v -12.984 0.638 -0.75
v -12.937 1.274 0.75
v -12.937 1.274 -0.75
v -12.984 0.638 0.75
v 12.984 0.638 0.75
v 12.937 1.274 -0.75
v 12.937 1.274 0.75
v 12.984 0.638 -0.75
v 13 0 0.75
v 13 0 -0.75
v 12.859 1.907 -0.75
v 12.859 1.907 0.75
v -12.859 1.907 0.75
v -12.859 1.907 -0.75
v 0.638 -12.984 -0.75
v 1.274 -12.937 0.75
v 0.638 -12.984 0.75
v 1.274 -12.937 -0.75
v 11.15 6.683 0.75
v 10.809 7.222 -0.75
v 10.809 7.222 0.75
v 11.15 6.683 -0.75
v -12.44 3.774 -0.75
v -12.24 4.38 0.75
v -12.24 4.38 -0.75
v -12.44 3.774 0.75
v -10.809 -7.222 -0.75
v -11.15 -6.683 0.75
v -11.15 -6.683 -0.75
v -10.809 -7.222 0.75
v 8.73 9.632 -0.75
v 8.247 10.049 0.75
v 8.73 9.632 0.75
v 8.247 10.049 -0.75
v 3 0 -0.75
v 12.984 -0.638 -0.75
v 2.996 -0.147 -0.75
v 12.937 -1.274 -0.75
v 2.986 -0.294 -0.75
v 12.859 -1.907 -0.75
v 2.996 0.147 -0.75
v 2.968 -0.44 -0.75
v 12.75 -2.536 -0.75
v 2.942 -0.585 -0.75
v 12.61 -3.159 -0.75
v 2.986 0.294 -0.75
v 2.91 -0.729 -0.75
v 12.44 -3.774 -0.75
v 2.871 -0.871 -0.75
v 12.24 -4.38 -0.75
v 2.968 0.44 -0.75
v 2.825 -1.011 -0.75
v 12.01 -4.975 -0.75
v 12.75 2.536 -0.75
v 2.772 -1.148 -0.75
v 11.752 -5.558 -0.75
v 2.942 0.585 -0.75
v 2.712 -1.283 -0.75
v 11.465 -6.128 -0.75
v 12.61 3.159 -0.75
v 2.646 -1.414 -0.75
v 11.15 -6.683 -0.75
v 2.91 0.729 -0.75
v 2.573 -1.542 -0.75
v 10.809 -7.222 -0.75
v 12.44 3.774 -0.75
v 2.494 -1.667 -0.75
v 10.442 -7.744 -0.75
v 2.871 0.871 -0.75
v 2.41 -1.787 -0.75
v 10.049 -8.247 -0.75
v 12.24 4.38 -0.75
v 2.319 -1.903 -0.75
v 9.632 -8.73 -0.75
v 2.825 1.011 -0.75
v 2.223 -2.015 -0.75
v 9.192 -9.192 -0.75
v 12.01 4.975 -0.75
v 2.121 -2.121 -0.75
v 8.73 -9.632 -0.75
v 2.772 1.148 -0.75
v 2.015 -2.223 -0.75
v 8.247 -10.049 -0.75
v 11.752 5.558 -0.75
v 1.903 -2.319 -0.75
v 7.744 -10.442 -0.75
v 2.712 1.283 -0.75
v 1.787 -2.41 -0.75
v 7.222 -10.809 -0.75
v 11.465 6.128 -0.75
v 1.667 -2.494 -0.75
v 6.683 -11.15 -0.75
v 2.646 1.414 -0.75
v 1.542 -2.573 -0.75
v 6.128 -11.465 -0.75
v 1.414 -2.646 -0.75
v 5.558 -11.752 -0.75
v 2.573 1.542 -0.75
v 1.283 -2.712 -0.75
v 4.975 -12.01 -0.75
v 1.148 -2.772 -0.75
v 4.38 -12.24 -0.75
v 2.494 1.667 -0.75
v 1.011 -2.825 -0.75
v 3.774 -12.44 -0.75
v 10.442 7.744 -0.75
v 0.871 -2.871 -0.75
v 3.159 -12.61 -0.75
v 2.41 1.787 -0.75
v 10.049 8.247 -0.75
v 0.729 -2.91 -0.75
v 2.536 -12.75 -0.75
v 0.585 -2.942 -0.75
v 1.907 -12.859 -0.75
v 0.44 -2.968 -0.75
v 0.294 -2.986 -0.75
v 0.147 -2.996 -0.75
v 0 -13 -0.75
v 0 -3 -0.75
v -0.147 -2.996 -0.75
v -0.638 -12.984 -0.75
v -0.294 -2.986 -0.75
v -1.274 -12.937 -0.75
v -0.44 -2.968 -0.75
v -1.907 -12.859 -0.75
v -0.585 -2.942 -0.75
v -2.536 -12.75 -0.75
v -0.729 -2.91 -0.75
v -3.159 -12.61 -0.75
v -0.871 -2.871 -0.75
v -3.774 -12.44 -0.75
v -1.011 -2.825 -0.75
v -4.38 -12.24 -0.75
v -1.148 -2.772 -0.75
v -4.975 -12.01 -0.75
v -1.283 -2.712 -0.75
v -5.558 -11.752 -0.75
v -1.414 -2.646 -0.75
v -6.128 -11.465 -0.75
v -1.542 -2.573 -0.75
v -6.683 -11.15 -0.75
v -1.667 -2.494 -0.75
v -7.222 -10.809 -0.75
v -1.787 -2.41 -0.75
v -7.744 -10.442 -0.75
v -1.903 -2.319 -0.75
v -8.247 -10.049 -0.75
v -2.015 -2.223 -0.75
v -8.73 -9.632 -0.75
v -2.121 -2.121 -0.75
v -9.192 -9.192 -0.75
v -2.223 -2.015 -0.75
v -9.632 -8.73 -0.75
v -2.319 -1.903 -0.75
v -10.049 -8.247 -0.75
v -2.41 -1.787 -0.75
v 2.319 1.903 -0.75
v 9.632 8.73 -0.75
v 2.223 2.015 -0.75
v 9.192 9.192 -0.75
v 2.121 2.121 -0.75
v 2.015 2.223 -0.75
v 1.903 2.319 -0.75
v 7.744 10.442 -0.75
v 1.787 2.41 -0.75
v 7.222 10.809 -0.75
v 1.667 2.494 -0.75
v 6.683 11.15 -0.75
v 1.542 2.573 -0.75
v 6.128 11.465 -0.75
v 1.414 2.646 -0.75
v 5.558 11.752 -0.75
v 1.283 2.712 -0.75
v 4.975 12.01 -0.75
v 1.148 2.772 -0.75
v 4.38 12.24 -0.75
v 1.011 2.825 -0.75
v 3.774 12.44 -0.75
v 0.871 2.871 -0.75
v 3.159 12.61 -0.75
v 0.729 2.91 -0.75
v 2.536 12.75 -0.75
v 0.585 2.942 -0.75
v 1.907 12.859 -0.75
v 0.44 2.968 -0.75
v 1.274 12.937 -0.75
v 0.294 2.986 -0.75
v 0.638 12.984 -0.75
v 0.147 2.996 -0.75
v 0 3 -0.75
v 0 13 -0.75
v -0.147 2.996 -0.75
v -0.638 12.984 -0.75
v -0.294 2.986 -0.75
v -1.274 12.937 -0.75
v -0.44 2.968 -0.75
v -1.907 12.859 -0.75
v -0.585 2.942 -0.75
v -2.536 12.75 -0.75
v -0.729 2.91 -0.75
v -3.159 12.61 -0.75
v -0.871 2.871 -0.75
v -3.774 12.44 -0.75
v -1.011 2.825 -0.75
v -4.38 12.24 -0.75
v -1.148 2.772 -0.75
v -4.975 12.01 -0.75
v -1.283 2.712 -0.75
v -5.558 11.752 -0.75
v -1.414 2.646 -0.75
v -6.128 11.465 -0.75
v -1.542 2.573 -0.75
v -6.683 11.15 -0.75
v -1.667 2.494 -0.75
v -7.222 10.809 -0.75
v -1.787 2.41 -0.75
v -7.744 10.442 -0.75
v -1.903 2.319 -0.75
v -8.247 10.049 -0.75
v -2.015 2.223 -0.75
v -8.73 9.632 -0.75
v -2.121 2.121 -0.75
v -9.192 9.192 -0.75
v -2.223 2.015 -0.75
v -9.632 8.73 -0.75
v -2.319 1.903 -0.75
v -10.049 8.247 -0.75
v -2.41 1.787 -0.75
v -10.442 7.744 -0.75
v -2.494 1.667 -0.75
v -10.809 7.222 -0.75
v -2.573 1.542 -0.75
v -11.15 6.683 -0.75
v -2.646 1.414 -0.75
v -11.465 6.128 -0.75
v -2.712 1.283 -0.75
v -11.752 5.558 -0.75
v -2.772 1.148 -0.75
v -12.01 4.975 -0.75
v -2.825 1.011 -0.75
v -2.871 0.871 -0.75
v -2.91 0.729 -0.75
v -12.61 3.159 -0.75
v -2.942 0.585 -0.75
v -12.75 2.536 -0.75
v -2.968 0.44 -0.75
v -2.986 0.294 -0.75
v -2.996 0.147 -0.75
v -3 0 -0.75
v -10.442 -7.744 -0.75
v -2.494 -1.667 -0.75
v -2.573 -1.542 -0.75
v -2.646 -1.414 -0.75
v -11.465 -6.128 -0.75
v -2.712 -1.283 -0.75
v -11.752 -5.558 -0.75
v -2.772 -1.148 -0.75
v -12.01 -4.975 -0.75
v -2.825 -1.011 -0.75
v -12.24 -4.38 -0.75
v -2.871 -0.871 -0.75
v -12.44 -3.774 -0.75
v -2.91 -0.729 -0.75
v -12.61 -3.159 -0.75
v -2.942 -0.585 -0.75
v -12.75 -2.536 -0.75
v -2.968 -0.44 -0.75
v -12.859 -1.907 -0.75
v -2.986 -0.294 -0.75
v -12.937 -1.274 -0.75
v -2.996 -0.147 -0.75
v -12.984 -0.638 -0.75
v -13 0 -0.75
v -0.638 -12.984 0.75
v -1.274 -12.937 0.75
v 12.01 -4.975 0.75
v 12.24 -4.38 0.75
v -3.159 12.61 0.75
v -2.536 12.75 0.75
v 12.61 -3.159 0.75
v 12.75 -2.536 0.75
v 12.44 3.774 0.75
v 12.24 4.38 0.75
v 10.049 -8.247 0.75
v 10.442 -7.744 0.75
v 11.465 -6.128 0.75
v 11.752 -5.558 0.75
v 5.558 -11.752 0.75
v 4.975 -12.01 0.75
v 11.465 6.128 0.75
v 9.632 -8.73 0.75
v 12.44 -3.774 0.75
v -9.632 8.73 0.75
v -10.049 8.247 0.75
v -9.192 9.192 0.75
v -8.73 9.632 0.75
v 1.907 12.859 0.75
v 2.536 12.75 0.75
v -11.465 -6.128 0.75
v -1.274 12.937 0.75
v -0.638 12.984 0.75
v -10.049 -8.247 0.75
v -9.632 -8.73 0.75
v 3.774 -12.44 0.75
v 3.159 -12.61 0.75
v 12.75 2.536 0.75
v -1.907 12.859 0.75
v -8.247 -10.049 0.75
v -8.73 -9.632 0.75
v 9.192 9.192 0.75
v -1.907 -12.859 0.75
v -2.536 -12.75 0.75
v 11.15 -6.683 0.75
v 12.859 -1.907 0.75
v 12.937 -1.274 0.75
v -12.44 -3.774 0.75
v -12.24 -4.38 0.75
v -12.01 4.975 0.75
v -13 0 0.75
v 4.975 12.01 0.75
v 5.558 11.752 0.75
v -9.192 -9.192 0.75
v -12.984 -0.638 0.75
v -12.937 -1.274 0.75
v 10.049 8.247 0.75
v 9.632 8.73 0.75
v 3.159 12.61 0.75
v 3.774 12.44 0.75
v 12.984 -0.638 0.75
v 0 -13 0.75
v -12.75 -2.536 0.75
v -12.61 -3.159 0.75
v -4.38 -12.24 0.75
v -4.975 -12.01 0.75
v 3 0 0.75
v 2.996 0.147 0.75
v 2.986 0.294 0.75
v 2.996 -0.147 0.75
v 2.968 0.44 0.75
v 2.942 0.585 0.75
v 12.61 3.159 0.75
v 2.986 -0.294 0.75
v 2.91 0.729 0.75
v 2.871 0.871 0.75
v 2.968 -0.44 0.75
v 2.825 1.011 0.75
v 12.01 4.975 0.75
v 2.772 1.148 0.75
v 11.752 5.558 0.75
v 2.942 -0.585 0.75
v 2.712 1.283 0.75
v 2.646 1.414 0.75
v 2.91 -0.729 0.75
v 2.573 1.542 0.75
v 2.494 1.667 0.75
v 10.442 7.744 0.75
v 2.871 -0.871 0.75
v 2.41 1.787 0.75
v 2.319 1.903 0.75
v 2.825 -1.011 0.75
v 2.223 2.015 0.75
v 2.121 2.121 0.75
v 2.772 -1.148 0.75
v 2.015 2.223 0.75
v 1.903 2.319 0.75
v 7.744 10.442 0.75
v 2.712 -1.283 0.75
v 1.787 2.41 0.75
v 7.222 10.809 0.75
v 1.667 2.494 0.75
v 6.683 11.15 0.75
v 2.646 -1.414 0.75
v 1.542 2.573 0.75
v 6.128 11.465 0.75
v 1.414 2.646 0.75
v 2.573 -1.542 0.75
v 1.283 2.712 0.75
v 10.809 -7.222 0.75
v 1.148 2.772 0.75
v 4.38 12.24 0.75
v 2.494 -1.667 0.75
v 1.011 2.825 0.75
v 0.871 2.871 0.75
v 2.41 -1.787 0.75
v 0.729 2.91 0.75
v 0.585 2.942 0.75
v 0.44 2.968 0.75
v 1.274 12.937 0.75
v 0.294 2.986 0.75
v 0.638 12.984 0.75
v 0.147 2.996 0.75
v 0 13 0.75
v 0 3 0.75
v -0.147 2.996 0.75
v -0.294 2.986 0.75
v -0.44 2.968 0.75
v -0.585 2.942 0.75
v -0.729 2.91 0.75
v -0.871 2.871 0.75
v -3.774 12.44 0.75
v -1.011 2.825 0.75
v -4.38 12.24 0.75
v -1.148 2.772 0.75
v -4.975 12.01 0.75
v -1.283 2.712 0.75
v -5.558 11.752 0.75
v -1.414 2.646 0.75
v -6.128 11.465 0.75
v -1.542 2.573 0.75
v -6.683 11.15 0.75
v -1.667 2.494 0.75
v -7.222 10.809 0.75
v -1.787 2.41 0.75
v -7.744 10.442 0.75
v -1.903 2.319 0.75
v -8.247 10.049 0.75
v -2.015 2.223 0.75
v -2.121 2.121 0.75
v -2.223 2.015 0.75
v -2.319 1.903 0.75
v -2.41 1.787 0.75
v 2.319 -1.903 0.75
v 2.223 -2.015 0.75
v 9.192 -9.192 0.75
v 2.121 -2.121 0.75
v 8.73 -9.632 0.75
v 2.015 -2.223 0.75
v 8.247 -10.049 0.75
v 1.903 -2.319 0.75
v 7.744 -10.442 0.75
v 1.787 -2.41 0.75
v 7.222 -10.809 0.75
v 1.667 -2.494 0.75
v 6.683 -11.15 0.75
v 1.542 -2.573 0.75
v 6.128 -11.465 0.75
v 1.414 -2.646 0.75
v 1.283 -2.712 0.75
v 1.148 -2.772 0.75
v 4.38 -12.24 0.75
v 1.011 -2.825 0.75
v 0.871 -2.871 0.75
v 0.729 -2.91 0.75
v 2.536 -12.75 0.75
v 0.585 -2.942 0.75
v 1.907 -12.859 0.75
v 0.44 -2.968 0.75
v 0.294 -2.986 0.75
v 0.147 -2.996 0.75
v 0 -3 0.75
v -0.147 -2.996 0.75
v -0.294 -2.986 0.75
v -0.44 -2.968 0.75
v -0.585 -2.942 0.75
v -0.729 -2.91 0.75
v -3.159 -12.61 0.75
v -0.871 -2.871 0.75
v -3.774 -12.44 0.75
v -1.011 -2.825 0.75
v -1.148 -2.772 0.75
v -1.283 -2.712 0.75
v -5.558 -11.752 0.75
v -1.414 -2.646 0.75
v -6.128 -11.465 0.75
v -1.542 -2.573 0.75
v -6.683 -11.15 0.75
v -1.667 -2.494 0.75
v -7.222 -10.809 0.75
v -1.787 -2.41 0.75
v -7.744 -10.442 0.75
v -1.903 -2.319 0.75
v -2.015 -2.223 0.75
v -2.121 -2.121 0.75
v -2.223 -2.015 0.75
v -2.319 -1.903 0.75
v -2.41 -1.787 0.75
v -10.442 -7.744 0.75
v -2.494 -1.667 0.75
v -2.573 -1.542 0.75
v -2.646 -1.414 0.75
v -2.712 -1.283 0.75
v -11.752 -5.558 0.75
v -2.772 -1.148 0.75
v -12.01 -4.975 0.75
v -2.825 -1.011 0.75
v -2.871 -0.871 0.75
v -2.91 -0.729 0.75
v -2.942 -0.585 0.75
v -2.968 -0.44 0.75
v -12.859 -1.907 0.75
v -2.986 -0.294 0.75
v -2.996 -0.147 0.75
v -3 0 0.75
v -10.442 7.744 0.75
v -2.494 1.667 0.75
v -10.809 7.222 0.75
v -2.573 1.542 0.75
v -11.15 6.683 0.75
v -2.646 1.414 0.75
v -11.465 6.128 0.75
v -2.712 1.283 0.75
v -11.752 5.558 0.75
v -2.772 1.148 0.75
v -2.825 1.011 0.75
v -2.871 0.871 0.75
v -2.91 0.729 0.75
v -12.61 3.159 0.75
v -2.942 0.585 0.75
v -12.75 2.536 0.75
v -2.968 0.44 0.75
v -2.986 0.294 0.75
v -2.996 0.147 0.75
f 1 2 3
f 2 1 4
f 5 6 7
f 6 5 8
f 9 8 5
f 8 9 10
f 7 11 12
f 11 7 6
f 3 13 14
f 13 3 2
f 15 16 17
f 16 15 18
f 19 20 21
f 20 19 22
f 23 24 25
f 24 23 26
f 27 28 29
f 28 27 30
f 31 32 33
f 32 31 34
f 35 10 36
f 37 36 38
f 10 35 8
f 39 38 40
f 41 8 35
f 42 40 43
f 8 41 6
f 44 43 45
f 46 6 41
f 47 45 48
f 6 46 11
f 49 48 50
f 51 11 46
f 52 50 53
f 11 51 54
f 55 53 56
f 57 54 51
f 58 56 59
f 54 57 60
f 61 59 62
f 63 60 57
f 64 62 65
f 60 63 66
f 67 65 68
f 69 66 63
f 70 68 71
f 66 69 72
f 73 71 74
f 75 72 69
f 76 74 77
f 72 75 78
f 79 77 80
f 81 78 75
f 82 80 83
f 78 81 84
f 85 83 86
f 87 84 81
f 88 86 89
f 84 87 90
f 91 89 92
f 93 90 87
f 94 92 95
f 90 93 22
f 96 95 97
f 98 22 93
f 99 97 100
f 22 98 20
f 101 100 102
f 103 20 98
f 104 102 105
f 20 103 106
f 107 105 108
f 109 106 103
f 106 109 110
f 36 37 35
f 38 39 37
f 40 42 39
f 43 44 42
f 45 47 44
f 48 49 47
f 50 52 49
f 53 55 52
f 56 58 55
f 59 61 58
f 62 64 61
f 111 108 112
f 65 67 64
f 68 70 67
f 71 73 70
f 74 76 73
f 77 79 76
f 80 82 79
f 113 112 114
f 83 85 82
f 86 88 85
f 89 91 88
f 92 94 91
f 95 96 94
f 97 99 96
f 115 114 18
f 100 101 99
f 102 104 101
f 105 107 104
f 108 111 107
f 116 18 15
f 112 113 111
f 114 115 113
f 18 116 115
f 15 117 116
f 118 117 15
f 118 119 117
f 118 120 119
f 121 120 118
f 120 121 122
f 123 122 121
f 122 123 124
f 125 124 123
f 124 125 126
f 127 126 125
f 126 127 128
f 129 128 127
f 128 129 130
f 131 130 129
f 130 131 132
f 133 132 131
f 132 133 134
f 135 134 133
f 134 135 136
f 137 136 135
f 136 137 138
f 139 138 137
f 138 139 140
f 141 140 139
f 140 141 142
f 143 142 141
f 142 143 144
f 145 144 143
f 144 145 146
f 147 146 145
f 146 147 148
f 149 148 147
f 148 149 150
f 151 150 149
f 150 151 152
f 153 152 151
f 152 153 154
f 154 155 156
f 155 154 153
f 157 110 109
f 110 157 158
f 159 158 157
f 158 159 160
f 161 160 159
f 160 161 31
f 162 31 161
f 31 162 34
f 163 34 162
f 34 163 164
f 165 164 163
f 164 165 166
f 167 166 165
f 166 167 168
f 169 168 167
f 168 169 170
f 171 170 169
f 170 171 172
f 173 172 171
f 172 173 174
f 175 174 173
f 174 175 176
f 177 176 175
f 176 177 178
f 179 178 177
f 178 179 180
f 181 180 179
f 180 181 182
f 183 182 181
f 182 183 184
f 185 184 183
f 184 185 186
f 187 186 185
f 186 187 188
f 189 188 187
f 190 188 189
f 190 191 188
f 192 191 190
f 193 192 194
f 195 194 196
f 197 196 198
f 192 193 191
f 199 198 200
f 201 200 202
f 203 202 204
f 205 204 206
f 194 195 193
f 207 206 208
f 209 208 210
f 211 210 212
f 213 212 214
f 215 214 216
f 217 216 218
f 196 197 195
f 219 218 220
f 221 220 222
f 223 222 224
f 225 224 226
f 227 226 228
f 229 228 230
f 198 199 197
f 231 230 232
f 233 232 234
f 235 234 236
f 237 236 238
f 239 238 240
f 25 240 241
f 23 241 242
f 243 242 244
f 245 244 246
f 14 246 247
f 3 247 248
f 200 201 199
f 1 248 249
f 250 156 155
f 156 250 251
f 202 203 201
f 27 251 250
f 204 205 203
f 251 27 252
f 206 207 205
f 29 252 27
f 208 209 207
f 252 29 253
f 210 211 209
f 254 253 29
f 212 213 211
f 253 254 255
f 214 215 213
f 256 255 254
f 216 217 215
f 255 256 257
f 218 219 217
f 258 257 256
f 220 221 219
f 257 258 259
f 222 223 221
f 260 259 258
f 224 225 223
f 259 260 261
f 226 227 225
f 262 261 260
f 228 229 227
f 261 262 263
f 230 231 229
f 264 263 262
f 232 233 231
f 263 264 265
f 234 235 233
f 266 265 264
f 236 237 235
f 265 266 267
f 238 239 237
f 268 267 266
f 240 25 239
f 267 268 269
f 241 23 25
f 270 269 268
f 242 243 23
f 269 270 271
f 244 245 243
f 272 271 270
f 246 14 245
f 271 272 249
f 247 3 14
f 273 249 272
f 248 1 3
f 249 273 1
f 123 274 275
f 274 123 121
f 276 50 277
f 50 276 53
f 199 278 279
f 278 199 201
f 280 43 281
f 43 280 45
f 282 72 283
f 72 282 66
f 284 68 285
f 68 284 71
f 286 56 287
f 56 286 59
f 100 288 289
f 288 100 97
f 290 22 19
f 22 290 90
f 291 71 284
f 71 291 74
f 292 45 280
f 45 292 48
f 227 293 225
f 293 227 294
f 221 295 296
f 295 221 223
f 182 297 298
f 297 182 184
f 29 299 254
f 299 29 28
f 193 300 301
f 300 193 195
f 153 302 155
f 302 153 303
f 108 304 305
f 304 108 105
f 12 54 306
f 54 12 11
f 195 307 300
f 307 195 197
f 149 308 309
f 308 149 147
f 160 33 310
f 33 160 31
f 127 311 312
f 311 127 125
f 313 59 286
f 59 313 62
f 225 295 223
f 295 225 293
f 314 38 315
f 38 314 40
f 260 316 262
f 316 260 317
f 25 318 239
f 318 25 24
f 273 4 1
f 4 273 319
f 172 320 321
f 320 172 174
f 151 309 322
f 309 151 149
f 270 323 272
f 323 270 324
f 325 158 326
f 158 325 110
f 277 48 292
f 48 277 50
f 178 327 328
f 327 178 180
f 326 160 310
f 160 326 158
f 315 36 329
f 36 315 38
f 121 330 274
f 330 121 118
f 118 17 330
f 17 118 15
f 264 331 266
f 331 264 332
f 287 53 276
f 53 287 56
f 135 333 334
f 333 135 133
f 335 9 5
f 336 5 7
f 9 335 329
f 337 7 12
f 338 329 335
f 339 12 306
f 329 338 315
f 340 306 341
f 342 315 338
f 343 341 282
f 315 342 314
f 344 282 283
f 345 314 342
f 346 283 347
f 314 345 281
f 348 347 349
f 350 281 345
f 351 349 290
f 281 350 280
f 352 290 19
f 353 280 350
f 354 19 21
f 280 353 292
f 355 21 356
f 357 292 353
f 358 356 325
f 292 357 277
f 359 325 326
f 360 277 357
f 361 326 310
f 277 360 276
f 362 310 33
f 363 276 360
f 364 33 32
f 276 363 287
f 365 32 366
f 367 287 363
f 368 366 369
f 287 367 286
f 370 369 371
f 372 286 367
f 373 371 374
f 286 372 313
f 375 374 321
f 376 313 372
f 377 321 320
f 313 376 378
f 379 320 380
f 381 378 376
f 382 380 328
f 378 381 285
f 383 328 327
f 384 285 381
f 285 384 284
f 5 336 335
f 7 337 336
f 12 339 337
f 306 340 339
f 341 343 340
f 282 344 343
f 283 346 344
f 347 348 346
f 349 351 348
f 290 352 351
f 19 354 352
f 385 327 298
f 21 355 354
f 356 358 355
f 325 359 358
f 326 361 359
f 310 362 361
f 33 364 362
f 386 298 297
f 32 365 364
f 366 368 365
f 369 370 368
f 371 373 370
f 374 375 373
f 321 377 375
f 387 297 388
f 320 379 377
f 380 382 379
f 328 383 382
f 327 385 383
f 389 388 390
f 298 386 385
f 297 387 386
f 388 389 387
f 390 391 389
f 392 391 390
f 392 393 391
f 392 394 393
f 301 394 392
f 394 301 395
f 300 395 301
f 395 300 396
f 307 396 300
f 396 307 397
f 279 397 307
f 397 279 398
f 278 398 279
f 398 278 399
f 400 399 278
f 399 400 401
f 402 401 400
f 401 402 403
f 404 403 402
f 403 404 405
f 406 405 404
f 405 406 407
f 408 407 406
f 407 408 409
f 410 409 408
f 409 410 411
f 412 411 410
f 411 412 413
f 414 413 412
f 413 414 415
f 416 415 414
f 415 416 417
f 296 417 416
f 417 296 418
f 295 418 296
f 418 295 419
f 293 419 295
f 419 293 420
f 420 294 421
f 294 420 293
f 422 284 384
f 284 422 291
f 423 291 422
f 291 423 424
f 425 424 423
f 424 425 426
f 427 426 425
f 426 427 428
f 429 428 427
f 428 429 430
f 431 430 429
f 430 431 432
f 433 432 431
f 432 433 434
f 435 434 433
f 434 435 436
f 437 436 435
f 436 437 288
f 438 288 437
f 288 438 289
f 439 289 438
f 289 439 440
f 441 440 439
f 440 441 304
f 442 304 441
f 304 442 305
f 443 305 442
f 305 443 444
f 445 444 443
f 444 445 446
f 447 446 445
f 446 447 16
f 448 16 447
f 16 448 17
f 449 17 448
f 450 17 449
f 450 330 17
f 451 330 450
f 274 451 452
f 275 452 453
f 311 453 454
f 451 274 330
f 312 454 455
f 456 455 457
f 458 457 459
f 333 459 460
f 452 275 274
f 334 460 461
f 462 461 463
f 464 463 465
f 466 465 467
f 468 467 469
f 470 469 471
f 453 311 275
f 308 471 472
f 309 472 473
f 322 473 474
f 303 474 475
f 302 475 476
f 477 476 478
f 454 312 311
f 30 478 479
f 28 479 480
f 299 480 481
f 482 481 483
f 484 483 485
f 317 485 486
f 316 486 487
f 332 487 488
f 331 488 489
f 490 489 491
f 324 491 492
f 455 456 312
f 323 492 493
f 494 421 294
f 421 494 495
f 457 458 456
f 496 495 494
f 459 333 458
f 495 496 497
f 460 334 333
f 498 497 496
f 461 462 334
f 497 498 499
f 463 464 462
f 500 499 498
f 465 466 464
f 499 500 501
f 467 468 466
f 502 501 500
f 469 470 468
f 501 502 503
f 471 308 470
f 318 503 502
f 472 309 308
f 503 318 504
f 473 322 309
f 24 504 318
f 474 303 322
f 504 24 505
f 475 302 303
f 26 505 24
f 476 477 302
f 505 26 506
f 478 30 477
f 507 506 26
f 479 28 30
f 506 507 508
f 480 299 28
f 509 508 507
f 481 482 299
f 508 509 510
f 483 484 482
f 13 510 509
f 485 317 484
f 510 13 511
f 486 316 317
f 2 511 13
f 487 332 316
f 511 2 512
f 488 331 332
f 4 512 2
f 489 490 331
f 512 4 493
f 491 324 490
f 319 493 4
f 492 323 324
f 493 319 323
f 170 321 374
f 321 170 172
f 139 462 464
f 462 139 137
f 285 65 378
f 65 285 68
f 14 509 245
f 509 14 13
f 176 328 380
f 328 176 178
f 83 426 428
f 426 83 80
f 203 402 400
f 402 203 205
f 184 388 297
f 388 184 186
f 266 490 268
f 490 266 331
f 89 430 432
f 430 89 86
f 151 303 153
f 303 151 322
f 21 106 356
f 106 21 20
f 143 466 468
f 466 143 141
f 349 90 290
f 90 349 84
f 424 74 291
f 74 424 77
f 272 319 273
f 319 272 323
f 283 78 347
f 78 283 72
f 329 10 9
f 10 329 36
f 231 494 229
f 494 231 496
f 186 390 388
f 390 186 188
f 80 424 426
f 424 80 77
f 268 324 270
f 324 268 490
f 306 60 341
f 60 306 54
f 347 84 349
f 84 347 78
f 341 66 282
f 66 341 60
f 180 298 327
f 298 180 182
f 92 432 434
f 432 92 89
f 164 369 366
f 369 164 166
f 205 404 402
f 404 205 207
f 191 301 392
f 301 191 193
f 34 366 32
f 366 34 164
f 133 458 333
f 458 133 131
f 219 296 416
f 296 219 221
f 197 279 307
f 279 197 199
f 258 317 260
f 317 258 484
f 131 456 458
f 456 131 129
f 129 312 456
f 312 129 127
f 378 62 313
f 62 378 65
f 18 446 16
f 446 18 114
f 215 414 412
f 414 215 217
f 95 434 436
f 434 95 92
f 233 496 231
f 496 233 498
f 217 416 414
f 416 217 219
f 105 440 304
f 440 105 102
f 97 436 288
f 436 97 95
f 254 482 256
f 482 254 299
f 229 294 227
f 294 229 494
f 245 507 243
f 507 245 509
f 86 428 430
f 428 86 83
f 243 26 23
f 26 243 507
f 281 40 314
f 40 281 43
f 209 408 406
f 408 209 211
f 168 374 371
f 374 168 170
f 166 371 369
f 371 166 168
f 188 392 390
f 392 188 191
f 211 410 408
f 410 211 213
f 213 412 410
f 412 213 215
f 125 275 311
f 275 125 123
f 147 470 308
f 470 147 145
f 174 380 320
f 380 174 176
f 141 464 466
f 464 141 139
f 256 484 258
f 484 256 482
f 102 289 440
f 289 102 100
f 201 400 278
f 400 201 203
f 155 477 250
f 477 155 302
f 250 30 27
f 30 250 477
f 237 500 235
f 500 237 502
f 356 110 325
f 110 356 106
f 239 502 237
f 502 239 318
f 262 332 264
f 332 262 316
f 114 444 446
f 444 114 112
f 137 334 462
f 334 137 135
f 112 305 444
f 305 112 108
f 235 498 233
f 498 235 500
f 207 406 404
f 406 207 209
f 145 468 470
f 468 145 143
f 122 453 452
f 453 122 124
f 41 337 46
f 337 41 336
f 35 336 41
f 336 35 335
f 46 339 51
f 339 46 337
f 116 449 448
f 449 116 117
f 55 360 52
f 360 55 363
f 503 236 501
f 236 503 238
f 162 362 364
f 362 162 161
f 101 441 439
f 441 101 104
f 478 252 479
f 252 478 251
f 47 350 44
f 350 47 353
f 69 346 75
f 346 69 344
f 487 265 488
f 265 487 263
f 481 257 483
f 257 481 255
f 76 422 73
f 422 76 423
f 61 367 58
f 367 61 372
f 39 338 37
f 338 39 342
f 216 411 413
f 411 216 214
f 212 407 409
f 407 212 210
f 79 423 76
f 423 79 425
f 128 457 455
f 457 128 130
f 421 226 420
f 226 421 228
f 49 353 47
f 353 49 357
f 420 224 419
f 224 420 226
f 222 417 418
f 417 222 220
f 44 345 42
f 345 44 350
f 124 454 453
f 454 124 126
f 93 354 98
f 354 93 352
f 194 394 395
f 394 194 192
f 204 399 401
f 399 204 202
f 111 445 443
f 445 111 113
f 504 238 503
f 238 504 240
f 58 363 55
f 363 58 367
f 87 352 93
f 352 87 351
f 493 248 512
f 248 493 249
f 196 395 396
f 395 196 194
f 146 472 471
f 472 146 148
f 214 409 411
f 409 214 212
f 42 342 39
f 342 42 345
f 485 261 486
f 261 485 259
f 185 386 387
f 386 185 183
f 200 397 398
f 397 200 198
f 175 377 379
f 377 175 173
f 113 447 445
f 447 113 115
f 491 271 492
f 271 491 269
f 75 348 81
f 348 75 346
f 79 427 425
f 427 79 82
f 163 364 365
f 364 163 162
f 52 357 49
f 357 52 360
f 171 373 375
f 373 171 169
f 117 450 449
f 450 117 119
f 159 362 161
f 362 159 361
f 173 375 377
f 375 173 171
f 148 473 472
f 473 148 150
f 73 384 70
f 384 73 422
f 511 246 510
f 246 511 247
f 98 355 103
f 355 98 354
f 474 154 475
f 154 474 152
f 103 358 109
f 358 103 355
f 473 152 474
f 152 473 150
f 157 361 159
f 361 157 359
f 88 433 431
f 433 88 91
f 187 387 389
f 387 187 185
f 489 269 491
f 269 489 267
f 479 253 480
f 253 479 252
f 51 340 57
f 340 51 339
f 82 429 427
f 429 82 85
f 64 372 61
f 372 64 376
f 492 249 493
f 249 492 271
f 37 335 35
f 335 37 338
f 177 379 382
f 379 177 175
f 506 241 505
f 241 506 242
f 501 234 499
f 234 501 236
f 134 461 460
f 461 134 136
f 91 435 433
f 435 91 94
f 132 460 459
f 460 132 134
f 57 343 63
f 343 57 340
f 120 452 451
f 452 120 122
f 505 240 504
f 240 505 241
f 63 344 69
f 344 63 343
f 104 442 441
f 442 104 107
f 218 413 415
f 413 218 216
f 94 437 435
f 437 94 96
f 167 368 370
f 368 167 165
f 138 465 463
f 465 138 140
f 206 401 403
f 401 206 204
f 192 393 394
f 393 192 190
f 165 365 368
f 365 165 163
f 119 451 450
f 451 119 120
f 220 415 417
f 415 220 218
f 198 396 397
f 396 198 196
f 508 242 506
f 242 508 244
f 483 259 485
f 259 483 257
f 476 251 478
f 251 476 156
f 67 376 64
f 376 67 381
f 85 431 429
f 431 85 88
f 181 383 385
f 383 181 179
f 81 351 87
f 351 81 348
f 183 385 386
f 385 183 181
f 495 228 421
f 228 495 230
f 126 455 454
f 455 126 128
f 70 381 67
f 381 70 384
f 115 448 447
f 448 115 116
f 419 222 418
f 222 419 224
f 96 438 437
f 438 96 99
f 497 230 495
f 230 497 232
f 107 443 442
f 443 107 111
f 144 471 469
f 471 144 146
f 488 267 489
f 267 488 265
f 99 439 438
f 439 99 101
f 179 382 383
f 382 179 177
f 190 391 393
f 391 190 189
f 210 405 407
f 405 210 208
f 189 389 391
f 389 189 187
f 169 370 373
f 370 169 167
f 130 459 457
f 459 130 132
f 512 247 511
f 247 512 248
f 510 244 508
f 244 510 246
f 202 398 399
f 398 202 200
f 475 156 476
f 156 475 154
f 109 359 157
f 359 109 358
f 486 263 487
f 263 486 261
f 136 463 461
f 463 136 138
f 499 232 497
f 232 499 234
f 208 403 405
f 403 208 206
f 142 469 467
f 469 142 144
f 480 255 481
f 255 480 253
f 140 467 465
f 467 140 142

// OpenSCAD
// Penny washer parameters (mm)
inner_diameter_mm = 6.0;   // hole diameter
outer_diameter_mm = 26.0;  // outside diameter
thickness_mm      = 1.5;   // washer thickness
eps_mm            = 0.2;   // boolean safety overlap

$fn = 128;

module penny_washer(inner_d, outer_d, t, eps=0.2) {
    difference() {
        cylinder(d=outer_d, h=t, center=true);
        cylinder(d=inner_d, h=t + 2*eps, center=true);
    }
}

// Single connected solid: just the washer
penny_washer(inner_diameter_mm, outer_diameter_mm, thickness_mm, eps_mm);
